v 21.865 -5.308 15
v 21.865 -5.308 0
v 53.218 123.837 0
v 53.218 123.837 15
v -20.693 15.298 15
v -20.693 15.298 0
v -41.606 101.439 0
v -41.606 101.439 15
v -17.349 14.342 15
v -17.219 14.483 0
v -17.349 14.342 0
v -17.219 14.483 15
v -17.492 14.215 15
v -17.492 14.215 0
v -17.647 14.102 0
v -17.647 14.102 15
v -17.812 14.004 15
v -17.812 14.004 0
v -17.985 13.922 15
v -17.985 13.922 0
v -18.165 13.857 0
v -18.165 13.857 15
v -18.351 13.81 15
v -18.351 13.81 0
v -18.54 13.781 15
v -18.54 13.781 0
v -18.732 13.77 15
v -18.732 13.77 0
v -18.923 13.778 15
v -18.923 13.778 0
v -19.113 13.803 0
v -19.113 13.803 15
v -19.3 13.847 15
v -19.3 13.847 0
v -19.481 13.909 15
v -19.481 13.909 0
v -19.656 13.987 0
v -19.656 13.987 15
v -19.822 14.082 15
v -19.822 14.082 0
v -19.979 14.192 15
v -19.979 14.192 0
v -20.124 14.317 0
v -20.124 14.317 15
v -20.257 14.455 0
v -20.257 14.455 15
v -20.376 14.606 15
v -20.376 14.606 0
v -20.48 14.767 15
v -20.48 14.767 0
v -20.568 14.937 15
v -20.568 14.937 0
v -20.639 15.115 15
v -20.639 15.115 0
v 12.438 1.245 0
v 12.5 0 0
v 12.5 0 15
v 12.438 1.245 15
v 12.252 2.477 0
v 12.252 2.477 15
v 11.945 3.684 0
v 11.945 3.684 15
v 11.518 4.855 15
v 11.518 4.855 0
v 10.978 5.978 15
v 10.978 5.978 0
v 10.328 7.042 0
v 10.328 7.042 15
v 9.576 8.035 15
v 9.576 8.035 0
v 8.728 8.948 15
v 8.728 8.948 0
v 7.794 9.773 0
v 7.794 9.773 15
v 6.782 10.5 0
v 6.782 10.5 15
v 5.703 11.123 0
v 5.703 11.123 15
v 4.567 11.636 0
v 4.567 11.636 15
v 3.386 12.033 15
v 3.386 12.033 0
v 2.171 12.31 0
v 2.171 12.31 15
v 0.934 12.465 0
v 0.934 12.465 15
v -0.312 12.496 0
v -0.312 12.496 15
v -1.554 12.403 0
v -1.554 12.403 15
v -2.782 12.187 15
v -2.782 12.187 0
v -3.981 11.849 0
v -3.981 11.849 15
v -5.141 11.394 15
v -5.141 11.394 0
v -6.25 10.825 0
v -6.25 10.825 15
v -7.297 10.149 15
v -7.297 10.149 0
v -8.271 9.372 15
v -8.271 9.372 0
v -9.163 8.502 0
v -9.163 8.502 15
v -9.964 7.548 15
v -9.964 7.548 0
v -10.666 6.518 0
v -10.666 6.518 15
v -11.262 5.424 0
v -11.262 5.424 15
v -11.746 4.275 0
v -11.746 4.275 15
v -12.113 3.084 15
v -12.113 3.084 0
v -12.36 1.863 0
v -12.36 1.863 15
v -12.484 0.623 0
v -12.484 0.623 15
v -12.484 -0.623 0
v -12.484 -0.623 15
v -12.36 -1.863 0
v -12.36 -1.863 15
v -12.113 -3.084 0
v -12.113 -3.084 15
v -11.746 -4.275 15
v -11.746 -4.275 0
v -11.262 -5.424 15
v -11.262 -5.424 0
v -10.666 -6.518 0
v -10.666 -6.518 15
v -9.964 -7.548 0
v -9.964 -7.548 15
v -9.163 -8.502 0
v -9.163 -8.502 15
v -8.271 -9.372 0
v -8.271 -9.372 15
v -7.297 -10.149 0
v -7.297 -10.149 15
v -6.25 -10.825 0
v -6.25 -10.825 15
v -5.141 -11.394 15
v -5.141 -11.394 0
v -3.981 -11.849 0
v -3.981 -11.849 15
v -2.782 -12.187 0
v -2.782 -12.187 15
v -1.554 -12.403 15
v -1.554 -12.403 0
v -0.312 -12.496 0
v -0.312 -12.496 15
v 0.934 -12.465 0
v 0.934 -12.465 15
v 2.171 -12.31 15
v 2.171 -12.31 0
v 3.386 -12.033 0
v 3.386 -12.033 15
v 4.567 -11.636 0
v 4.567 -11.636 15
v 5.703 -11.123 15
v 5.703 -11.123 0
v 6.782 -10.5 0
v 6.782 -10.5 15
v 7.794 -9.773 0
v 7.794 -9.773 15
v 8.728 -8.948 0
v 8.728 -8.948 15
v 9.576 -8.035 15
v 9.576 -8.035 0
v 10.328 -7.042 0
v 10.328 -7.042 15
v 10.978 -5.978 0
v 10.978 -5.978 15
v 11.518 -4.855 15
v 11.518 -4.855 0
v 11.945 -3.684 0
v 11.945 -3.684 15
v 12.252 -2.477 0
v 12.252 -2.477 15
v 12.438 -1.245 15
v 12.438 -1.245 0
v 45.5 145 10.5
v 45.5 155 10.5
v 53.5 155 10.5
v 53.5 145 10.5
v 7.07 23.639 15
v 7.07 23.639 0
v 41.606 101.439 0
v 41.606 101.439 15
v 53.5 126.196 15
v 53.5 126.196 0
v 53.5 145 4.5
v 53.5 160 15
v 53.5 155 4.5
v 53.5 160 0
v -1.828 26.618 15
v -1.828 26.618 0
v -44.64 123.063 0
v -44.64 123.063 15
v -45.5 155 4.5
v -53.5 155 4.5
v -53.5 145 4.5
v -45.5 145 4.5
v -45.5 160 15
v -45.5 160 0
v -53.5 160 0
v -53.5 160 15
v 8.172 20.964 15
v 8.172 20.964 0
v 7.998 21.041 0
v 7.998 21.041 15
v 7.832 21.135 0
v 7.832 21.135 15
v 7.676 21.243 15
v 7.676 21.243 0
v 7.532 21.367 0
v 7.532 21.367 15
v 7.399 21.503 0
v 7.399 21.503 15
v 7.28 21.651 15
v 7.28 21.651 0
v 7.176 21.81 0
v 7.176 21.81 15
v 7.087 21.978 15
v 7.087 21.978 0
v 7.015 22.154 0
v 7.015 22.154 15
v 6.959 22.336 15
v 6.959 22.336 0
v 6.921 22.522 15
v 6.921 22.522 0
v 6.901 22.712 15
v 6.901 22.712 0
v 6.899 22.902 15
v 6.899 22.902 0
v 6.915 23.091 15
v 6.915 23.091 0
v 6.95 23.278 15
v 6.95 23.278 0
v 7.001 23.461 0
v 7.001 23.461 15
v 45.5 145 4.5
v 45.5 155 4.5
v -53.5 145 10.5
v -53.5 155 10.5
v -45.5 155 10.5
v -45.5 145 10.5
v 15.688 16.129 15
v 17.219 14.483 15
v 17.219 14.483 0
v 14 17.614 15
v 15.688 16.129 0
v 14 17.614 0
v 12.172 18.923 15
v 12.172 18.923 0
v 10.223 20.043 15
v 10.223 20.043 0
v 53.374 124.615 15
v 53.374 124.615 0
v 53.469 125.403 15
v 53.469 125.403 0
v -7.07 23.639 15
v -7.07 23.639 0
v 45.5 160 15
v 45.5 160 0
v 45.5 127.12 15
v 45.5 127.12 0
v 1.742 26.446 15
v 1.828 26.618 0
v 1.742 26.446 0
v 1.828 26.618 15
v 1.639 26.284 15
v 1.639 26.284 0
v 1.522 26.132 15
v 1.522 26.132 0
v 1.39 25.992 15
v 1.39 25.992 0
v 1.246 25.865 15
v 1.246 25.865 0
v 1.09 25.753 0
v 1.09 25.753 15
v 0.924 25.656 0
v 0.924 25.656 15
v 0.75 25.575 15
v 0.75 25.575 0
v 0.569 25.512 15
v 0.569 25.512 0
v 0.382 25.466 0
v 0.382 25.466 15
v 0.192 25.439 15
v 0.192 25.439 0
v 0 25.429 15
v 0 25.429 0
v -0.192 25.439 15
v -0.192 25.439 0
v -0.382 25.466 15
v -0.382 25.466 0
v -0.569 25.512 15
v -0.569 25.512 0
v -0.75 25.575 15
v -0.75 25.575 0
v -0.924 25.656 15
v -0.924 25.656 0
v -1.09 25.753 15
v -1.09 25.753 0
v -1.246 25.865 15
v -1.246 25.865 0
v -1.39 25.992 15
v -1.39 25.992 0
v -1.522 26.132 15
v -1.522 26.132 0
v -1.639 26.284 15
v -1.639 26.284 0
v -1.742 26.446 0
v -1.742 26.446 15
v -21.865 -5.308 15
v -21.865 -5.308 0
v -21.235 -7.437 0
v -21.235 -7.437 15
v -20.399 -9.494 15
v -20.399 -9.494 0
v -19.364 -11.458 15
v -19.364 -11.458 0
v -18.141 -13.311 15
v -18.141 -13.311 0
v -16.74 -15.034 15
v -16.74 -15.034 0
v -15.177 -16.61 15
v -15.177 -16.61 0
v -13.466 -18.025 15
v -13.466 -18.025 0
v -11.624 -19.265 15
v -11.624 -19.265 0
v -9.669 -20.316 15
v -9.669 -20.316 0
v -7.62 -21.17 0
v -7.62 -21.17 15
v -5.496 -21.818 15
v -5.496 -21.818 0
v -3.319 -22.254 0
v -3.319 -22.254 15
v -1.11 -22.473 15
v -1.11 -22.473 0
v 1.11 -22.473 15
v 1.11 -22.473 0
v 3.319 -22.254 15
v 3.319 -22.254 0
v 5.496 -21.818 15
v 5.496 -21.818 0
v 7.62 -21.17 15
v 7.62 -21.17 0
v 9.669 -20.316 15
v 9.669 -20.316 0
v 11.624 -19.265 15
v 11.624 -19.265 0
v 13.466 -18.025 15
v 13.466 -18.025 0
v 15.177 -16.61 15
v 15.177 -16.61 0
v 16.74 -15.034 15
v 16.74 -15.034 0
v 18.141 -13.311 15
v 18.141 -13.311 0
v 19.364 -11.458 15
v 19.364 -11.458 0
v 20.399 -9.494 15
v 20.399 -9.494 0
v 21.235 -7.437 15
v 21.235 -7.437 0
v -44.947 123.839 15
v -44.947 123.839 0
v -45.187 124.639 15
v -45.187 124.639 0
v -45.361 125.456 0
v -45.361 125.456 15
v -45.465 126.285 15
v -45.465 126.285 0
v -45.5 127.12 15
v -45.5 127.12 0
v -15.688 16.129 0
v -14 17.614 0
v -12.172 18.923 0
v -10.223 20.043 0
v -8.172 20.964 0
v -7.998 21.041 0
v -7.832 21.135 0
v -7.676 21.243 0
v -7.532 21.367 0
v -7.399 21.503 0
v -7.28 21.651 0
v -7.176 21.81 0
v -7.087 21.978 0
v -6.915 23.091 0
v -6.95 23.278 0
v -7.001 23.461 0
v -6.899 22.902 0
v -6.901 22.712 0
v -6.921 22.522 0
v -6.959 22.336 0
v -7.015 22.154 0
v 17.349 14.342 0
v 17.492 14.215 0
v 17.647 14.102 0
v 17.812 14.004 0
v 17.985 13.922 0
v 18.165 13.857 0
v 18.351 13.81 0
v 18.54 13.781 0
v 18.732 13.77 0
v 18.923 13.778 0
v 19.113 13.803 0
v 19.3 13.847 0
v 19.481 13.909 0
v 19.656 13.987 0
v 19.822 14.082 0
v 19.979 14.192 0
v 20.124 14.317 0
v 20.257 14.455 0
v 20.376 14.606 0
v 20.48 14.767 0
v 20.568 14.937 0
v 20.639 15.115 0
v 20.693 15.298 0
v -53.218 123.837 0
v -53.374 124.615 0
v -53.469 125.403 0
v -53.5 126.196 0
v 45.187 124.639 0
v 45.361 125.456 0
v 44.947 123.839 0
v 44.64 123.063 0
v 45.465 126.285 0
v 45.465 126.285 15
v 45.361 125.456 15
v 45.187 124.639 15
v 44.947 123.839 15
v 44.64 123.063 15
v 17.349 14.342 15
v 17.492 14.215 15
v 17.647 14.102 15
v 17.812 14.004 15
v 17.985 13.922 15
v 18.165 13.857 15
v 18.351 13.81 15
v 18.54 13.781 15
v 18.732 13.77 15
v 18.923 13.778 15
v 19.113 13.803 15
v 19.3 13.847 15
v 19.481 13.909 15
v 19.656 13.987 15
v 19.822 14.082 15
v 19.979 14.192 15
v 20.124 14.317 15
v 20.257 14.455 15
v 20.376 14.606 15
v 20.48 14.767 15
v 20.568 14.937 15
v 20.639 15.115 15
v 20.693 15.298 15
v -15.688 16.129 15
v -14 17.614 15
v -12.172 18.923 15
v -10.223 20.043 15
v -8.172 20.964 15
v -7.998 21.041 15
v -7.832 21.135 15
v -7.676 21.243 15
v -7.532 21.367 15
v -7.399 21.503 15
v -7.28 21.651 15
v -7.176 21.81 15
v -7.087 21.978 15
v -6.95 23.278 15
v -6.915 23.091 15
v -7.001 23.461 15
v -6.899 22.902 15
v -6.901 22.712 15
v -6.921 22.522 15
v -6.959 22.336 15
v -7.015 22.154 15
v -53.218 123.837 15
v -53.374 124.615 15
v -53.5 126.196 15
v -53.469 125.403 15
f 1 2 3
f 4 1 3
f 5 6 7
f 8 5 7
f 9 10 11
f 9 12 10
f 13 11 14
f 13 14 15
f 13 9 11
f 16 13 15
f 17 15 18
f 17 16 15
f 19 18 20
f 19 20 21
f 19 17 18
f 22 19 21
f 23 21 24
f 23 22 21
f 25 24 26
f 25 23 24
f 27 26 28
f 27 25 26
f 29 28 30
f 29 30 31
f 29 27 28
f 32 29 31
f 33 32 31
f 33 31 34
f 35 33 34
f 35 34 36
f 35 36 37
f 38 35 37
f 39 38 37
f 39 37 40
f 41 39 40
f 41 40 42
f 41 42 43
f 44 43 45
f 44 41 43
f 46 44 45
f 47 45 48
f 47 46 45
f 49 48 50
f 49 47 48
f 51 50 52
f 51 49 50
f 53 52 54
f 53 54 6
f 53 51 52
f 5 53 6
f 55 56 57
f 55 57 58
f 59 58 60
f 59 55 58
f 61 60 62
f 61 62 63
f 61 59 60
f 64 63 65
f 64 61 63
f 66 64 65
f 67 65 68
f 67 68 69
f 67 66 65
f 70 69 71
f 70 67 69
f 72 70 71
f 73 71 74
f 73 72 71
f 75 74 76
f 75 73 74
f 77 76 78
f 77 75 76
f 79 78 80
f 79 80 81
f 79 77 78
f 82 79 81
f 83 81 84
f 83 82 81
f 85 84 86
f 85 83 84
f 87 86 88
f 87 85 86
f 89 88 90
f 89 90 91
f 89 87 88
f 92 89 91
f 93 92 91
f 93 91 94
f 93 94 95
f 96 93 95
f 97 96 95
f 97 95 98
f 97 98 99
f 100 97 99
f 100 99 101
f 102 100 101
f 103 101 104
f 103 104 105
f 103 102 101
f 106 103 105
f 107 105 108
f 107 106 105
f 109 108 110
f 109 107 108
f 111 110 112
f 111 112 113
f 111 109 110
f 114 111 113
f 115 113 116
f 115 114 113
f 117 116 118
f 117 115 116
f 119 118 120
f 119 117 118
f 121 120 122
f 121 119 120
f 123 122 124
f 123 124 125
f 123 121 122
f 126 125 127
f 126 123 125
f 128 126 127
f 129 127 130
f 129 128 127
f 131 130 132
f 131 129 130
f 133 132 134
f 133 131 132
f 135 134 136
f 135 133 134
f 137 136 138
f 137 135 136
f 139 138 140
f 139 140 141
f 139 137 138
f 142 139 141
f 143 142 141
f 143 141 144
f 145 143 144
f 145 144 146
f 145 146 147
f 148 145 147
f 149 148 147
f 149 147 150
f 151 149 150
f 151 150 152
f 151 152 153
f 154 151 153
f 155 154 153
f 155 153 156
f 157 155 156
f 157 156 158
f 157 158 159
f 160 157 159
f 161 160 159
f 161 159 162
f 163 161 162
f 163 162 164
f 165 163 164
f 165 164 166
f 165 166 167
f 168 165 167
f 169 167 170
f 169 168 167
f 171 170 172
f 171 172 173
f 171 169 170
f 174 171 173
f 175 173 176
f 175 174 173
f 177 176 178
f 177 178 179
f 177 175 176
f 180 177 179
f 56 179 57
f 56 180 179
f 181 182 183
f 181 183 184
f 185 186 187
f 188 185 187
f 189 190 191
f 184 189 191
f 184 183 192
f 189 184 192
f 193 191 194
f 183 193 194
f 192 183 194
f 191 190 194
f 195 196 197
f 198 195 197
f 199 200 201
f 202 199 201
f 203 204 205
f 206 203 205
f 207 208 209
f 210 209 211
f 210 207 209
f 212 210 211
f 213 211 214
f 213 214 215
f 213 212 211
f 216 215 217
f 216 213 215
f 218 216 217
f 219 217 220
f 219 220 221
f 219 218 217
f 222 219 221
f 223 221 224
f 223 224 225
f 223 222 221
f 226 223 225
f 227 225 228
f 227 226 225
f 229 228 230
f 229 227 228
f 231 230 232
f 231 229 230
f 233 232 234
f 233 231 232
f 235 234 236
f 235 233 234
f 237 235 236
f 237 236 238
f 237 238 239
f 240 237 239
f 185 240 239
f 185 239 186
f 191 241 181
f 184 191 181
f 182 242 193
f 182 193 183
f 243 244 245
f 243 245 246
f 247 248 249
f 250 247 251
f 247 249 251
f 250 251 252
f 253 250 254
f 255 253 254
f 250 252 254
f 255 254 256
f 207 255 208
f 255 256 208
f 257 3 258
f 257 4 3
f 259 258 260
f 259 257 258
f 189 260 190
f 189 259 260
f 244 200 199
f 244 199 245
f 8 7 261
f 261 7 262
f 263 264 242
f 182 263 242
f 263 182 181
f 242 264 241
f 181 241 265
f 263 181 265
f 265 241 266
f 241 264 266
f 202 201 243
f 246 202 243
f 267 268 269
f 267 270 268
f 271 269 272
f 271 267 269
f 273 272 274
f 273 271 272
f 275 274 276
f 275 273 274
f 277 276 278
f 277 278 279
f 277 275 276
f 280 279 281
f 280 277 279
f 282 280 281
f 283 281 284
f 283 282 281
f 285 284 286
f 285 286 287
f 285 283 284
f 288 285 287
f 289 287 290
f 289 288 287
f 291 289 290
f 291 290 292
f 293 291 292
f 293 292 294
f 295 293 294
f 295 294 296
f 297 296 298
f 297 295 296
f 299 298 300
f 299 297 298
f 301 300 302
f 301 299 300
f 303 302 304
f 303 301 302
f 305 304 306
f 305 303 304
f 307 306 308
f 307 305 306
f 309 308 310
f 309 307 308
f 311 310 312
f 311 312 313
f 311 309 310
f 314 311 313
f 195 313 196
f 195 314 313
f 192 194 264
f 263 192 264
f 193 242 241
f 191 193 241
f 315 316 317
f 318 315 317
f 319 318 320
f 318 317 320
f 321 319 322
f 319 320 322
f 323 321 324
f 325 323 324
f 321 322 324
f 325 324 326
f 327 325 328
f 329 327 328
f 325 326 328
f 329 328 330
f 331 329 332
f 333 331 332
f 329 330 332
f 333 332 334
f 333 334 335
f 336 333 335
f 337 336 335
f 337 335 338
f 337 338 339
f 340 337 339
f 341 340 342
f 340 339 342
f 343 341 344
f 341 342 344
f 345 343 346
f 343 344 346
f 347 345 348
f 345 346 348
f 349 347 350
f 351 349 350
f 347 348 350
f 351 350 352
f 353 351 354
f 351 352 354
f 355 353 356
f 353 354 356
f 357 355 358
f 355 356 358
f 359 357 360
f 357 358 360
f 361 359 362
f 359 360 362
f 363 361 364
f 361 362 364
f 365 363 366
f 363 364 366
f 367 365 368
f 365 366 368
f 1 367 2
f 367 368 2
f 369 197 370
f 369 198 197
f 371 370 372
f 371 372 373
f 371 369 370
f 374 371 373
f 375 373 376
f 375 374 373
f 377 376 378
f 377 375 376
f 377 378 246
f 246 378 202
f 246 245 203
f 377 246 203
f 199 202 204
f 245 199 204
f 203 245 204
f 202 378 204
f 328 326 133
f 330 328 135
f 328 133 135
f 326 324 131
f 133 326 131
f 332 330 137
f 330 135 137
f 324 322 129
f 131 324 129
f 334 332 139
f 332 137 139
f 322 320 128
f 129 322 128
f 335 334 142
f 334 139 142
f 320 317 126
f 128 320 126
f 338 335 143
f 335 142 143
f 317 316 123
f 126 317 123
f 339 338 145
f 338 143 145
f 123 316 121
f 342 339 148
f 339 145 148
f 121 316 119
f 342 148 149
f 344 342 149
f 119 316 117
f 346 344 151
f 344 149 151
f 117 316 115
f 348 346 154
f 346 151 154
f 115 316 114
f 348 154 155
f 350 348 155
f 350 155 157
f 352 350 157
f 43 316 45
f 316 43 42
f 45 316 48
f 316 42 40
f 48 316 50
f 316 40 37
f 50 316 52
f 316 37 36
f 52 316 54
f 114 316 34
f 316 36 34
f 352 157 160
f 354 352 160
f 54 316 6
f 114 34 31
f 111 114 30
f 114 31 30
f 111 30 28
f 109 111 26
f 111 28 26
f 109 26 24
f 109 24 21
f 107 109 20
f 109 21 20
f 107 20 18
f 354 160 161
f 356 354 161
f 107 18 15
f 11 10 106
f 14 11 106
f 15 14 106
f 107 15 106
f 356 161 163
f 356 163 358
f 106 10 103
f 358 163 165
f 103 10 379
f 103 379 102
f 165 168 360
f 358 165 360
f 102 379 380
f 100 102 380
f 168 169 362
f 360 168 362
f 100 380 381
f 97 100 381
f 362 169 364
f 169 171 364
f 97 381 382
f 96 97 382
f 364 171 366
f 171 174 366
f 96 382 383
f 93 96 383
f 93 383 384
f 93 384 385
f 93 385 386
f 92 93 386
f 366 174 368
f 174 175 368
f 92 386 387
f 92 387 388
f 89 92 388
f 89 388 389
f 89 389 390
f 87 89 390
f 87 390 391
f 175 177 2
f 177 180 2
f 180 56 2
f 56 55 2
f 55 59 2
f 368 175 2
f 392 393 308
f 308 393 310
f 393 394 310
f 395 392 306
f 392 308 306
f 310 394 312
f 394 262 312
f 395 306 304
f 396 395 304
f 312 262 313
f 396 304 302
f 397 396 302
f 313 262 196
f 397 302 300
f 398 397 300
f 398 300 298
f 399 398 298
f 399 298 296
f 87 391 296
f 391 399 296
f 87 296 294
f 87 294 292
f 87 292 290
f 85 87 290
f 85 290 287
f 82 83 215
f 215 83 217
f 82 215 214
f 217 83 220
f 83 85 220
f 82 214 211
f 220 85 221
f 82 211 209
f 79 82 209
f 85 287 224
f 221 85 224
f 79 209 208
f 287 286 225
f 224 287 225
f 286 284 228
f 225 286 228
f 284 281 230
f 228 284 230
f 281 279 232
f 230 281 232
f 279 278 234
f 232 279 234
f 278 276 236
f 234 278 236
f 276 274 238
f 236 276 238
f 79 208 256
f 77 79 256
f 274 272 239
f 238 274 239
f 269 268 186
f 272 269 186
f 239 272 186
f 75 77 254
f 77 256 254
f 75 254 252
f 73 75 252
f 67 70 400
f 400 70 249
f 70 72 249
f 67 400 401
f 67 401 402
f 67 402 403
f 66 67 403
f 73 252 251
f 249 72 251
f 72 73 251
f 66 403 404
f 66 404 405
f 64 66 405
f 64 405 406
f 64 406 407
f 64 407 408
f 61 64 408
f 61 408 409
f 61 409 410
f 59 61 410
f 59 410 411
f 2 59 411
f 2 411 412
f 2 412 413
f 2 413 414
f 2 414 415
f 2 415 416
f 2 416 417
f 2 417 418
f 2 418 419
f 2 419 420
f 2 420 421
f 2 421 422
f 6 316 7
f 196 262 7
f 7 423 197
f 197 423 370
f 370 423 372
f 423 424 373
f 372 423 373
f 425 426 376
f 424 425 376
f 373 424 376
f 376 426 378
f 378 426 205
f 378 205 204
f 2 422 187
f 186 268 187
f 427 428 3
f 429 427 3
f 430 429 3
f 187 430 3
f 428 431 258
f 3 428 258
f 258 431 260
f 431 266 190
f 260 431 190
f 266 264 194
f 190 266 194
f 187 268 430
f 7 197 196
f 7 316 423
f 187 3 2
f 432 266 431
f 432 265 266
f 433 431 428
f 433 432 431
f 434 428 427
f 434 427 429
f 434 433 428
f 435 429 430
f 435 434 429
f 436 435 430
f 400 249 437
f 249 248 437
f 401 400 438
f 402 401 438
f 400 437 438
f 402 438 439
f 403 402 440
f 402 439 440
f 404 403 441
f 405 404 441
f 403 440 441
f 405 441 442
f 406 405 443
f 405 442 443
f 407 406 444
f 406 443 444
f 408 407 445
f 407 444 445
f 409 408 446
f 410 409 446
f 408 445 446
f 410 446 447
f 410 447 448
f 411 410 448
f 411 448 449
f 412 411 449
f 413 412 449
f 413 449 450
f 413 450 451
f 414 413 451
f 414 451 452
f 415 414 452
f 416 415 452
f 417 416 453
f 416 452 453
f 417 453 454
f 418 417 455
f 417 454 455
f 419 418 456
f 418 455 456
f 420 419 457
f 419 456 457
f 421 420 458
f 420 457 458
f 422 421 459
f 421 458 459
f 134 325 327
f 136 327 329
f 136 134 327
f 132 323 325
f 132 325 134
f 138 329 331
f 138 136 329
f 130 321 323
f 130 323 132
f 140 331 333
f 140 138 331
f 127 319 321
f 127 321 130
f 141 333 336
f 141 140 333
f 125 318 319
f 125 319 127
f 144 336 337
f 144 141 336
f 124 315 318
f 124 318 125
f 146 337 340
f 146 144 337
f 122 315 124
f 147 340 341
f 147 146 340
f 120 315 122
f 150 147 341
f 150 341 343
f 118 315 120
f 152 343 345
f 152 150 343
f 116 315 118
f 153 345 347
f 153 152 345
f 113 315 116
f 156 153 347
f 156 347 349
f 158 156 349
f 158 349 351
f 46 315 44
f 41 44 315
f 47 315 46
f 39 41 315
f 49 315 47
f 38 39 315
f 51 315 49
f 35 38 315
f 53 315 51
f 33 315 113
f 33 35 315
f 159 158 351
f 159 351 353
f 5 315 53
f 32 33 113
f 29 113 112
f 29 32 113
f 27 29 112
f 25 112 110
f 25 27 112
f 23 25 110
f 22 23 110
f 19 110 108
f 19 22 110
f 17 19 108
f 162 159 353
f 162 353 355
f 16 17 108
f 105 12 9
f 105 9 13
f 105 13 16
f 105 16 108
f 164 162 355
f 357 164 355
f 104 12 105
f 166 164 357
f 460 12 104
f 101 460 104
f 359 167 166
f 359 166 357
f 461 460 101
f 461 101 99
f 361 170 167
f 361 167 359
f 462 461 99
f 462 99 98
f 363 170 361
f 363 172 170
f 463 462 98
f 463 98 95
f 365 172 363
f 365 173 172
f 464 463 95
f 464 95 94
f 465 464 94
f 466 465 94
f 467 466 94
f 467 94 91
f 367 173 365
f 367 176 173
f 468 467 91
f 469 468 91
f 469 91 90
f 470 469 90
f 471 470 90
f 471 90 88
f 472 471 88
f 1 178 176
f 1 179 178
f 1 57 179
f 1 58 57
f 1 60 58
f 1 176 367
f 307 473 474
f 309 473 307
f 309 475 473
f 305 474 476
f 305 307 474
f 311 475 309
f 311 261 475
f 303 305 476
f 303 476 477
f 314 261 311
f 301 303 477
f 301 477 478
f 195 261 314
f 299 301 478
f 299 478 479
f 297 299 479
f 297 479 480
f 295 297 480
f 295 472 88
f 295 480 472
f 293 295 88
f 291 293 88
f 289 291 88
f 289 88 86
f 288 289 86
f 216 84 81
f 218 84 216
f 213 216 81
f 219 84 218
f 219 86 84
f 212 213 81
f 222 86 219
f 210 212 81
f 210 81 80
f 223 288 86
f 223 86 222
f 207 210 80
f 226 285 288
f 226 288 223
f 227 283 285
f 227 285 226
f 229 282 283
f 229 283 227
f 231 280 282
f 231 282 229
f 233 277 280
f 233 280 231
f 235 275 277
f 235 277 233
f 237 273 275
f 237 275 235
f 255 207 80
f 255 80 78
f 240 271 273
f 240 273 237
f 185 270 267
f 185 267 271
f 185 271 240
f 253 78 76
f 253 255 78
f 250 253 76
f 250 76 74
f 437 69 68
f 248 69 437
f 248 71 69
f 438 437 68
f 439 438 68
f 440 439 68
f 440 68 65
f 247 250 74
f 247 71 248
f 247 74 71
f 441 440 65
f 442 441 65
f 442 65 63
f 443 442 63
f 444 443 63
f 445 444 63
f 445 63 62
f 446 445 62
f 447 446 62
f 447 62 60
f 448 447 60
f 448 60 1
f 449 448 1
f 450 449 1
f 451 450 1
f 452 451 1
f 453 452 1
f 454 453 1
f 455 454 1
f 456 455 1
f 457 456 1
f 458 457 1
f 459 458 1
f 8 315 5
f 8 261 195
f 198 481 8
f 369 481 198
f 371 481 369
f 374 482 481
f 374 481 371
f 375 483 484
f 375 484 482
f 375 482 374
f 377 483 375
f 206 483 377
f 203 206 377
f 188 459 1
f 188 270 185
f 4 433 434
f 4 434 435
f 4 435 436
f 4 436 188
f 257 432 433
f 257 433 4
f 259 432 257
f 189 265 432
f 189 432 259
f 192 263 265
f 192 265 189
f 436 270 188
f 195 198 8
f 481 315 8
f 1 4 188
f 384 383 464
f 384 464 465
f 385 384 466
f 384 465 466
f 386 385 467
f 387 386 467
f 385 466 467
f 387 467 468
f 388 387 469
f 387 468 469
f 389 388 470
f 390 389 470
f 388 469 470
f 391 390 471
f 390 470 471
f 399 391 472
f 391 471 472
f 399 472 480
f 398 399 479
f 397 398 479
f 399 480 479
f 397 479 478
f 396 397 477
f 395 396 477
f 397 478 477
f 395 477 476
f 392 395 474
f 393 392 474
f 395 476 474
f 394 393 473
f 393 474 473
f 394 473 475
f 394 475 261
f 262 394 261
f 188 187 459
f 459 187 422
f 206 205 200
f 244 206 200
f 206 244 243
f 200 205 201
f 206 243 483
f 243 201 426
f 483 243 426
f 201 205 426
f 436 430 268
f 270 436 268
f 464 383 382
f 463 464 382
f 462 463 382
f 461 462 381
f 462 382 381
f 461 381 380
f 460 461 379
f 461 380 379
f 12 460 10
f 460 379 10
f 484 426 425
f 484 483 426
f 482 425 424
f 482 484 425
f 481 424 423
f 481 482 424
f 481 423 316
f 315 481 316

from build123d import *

# Parameters (mm, degrees)
F0_R     = 12.5
F1_DEPTH = 15
F2_R     = 10
F3_R     = 2
F4_W     = 10
F4_H     = 6
F5_DEPTH = 107.001


with BuildPart() as f1:
    # F0 (on Top) → F1 (new body)
    with BuildSketch(Plane.XY):
        with BuildLine():
            ThreePointArc((21.864888, -5.308172), (22.340658, -2.673016), (22.5, 0))
            ThreePointArc((22.5, 0), (21.774068, 5.669212), (19.643114, 10.972606))
            ThreePointArc((19.643114, 10.972606), (13.968986, 17.638521), (6.180399, 21.634525))
            ThreePointArc((6.180399, 21.634525), (3.120352, 22.282581), (0, 22.5))
            ThreePointArc((0, 22.5), (-3.120352, 22.282581), (-6.180399, 21.634525))
            ThreePointArc((-6.180399, 21.634525), (-13.968986, 17.638521), (-19.643114, 10.972606))
            ThreePointArc((-19.643114, 10.972606), (-22.293373, 3.042289), (-21.864888, -5.308172))
            ThreePointArc((-21.864888, -5.308172), (0, -22.5), (21.864888, -5.308172))
        make_face()
        Circle(F0_R, mode=Mode.SUBTRACT)
        with BuildLine():
            ThreePointArc((19.643114, 10.972606), (21.774068, 5.669212), (22.5, 0))
            ThreePointArc((22.5, 0), (22.340658, -2.673016), (21.864888, -5.308172))
            Line((21.864888, -5.308172), (53.5, 125))
            Line((53.5, 125), (53.5, 160))
            Line((53.5, 160), (45.5, 160))
            Line((45.5, 160), (45.5, 125))
            Line((45.5, 125), (0, 22.5))
            ThreePointArc((0, 22.5), (3.120352, 22.282581), (6.180399, 21.634525))
            Line((6.180399, 21.634525), (41.605751, 101.438889))
            Line((41.605751, 101.438889), (19.643114, 10.972606))
        make_face()
        with BuildLine():
            Line((-53.5, 125), (-21.864888, -5.308172))
            ThreePointArc((-21.864888, -5.308172), (-22.293373, 3.042289), (-19.643114, 10.972606))
            Line((-19.643114, 10.972606), (-41.605751, 101.438889))
            Line((-41.605751, 101.438889), (-6.180399, 21.634525))
            ThreePointArc((-6.180399, 21.634525), (-3.120352, 22.282581), (0, 22.5))
            Line((0, 22.5), (-45.5, 125))
            Line((-45.5, 125), (-45.5, 160))
            Line((-45.5, 160), (-53.5, 160))
            Line((-53.5, 160), (-53.5, 125))
        make_face()
    extrude(amount=F1_DEPTH)

    # F2
    f2_edges = [f1.edges().sort_by_distance(p)[0] for p in [
        (-53.5, 125, 7.5),
        (45.5, 125, 7.5),
        (-45.5, 125, 7.5),
        (53.5, 125, 7.5),
    ]]
    fillet(f2_edges, radius=F2_R)

    # F3
    f3_edges = [f1.edges().sort_by_distance(p)[0] for p in [
        (-6.180399, 21.634525, 7.5),
        (-19.643114, 10.972606, 7.5),
        (19.643114, 10.972606, 7.5),
        (6.180399, 21.634525, 7.5),
        (0, 22.5, 7.5),
    ]]
    fillet(f3_edges, radius=F3_R)

    # F4 (on face) → F5 (cut, through all)
    with BuildSketch(Plane(origin=(-53.5, 0, 0), x_dir=(0, -1, 0), z_dir=(-1, 0, 0))):
        with Locations((-150, 7.5)):
            Rectangle(F4_W, F4_H)
    extrude(amount=-F5_DEPTH, mode=Mode.SUBTRACT)


solid = f1.part
